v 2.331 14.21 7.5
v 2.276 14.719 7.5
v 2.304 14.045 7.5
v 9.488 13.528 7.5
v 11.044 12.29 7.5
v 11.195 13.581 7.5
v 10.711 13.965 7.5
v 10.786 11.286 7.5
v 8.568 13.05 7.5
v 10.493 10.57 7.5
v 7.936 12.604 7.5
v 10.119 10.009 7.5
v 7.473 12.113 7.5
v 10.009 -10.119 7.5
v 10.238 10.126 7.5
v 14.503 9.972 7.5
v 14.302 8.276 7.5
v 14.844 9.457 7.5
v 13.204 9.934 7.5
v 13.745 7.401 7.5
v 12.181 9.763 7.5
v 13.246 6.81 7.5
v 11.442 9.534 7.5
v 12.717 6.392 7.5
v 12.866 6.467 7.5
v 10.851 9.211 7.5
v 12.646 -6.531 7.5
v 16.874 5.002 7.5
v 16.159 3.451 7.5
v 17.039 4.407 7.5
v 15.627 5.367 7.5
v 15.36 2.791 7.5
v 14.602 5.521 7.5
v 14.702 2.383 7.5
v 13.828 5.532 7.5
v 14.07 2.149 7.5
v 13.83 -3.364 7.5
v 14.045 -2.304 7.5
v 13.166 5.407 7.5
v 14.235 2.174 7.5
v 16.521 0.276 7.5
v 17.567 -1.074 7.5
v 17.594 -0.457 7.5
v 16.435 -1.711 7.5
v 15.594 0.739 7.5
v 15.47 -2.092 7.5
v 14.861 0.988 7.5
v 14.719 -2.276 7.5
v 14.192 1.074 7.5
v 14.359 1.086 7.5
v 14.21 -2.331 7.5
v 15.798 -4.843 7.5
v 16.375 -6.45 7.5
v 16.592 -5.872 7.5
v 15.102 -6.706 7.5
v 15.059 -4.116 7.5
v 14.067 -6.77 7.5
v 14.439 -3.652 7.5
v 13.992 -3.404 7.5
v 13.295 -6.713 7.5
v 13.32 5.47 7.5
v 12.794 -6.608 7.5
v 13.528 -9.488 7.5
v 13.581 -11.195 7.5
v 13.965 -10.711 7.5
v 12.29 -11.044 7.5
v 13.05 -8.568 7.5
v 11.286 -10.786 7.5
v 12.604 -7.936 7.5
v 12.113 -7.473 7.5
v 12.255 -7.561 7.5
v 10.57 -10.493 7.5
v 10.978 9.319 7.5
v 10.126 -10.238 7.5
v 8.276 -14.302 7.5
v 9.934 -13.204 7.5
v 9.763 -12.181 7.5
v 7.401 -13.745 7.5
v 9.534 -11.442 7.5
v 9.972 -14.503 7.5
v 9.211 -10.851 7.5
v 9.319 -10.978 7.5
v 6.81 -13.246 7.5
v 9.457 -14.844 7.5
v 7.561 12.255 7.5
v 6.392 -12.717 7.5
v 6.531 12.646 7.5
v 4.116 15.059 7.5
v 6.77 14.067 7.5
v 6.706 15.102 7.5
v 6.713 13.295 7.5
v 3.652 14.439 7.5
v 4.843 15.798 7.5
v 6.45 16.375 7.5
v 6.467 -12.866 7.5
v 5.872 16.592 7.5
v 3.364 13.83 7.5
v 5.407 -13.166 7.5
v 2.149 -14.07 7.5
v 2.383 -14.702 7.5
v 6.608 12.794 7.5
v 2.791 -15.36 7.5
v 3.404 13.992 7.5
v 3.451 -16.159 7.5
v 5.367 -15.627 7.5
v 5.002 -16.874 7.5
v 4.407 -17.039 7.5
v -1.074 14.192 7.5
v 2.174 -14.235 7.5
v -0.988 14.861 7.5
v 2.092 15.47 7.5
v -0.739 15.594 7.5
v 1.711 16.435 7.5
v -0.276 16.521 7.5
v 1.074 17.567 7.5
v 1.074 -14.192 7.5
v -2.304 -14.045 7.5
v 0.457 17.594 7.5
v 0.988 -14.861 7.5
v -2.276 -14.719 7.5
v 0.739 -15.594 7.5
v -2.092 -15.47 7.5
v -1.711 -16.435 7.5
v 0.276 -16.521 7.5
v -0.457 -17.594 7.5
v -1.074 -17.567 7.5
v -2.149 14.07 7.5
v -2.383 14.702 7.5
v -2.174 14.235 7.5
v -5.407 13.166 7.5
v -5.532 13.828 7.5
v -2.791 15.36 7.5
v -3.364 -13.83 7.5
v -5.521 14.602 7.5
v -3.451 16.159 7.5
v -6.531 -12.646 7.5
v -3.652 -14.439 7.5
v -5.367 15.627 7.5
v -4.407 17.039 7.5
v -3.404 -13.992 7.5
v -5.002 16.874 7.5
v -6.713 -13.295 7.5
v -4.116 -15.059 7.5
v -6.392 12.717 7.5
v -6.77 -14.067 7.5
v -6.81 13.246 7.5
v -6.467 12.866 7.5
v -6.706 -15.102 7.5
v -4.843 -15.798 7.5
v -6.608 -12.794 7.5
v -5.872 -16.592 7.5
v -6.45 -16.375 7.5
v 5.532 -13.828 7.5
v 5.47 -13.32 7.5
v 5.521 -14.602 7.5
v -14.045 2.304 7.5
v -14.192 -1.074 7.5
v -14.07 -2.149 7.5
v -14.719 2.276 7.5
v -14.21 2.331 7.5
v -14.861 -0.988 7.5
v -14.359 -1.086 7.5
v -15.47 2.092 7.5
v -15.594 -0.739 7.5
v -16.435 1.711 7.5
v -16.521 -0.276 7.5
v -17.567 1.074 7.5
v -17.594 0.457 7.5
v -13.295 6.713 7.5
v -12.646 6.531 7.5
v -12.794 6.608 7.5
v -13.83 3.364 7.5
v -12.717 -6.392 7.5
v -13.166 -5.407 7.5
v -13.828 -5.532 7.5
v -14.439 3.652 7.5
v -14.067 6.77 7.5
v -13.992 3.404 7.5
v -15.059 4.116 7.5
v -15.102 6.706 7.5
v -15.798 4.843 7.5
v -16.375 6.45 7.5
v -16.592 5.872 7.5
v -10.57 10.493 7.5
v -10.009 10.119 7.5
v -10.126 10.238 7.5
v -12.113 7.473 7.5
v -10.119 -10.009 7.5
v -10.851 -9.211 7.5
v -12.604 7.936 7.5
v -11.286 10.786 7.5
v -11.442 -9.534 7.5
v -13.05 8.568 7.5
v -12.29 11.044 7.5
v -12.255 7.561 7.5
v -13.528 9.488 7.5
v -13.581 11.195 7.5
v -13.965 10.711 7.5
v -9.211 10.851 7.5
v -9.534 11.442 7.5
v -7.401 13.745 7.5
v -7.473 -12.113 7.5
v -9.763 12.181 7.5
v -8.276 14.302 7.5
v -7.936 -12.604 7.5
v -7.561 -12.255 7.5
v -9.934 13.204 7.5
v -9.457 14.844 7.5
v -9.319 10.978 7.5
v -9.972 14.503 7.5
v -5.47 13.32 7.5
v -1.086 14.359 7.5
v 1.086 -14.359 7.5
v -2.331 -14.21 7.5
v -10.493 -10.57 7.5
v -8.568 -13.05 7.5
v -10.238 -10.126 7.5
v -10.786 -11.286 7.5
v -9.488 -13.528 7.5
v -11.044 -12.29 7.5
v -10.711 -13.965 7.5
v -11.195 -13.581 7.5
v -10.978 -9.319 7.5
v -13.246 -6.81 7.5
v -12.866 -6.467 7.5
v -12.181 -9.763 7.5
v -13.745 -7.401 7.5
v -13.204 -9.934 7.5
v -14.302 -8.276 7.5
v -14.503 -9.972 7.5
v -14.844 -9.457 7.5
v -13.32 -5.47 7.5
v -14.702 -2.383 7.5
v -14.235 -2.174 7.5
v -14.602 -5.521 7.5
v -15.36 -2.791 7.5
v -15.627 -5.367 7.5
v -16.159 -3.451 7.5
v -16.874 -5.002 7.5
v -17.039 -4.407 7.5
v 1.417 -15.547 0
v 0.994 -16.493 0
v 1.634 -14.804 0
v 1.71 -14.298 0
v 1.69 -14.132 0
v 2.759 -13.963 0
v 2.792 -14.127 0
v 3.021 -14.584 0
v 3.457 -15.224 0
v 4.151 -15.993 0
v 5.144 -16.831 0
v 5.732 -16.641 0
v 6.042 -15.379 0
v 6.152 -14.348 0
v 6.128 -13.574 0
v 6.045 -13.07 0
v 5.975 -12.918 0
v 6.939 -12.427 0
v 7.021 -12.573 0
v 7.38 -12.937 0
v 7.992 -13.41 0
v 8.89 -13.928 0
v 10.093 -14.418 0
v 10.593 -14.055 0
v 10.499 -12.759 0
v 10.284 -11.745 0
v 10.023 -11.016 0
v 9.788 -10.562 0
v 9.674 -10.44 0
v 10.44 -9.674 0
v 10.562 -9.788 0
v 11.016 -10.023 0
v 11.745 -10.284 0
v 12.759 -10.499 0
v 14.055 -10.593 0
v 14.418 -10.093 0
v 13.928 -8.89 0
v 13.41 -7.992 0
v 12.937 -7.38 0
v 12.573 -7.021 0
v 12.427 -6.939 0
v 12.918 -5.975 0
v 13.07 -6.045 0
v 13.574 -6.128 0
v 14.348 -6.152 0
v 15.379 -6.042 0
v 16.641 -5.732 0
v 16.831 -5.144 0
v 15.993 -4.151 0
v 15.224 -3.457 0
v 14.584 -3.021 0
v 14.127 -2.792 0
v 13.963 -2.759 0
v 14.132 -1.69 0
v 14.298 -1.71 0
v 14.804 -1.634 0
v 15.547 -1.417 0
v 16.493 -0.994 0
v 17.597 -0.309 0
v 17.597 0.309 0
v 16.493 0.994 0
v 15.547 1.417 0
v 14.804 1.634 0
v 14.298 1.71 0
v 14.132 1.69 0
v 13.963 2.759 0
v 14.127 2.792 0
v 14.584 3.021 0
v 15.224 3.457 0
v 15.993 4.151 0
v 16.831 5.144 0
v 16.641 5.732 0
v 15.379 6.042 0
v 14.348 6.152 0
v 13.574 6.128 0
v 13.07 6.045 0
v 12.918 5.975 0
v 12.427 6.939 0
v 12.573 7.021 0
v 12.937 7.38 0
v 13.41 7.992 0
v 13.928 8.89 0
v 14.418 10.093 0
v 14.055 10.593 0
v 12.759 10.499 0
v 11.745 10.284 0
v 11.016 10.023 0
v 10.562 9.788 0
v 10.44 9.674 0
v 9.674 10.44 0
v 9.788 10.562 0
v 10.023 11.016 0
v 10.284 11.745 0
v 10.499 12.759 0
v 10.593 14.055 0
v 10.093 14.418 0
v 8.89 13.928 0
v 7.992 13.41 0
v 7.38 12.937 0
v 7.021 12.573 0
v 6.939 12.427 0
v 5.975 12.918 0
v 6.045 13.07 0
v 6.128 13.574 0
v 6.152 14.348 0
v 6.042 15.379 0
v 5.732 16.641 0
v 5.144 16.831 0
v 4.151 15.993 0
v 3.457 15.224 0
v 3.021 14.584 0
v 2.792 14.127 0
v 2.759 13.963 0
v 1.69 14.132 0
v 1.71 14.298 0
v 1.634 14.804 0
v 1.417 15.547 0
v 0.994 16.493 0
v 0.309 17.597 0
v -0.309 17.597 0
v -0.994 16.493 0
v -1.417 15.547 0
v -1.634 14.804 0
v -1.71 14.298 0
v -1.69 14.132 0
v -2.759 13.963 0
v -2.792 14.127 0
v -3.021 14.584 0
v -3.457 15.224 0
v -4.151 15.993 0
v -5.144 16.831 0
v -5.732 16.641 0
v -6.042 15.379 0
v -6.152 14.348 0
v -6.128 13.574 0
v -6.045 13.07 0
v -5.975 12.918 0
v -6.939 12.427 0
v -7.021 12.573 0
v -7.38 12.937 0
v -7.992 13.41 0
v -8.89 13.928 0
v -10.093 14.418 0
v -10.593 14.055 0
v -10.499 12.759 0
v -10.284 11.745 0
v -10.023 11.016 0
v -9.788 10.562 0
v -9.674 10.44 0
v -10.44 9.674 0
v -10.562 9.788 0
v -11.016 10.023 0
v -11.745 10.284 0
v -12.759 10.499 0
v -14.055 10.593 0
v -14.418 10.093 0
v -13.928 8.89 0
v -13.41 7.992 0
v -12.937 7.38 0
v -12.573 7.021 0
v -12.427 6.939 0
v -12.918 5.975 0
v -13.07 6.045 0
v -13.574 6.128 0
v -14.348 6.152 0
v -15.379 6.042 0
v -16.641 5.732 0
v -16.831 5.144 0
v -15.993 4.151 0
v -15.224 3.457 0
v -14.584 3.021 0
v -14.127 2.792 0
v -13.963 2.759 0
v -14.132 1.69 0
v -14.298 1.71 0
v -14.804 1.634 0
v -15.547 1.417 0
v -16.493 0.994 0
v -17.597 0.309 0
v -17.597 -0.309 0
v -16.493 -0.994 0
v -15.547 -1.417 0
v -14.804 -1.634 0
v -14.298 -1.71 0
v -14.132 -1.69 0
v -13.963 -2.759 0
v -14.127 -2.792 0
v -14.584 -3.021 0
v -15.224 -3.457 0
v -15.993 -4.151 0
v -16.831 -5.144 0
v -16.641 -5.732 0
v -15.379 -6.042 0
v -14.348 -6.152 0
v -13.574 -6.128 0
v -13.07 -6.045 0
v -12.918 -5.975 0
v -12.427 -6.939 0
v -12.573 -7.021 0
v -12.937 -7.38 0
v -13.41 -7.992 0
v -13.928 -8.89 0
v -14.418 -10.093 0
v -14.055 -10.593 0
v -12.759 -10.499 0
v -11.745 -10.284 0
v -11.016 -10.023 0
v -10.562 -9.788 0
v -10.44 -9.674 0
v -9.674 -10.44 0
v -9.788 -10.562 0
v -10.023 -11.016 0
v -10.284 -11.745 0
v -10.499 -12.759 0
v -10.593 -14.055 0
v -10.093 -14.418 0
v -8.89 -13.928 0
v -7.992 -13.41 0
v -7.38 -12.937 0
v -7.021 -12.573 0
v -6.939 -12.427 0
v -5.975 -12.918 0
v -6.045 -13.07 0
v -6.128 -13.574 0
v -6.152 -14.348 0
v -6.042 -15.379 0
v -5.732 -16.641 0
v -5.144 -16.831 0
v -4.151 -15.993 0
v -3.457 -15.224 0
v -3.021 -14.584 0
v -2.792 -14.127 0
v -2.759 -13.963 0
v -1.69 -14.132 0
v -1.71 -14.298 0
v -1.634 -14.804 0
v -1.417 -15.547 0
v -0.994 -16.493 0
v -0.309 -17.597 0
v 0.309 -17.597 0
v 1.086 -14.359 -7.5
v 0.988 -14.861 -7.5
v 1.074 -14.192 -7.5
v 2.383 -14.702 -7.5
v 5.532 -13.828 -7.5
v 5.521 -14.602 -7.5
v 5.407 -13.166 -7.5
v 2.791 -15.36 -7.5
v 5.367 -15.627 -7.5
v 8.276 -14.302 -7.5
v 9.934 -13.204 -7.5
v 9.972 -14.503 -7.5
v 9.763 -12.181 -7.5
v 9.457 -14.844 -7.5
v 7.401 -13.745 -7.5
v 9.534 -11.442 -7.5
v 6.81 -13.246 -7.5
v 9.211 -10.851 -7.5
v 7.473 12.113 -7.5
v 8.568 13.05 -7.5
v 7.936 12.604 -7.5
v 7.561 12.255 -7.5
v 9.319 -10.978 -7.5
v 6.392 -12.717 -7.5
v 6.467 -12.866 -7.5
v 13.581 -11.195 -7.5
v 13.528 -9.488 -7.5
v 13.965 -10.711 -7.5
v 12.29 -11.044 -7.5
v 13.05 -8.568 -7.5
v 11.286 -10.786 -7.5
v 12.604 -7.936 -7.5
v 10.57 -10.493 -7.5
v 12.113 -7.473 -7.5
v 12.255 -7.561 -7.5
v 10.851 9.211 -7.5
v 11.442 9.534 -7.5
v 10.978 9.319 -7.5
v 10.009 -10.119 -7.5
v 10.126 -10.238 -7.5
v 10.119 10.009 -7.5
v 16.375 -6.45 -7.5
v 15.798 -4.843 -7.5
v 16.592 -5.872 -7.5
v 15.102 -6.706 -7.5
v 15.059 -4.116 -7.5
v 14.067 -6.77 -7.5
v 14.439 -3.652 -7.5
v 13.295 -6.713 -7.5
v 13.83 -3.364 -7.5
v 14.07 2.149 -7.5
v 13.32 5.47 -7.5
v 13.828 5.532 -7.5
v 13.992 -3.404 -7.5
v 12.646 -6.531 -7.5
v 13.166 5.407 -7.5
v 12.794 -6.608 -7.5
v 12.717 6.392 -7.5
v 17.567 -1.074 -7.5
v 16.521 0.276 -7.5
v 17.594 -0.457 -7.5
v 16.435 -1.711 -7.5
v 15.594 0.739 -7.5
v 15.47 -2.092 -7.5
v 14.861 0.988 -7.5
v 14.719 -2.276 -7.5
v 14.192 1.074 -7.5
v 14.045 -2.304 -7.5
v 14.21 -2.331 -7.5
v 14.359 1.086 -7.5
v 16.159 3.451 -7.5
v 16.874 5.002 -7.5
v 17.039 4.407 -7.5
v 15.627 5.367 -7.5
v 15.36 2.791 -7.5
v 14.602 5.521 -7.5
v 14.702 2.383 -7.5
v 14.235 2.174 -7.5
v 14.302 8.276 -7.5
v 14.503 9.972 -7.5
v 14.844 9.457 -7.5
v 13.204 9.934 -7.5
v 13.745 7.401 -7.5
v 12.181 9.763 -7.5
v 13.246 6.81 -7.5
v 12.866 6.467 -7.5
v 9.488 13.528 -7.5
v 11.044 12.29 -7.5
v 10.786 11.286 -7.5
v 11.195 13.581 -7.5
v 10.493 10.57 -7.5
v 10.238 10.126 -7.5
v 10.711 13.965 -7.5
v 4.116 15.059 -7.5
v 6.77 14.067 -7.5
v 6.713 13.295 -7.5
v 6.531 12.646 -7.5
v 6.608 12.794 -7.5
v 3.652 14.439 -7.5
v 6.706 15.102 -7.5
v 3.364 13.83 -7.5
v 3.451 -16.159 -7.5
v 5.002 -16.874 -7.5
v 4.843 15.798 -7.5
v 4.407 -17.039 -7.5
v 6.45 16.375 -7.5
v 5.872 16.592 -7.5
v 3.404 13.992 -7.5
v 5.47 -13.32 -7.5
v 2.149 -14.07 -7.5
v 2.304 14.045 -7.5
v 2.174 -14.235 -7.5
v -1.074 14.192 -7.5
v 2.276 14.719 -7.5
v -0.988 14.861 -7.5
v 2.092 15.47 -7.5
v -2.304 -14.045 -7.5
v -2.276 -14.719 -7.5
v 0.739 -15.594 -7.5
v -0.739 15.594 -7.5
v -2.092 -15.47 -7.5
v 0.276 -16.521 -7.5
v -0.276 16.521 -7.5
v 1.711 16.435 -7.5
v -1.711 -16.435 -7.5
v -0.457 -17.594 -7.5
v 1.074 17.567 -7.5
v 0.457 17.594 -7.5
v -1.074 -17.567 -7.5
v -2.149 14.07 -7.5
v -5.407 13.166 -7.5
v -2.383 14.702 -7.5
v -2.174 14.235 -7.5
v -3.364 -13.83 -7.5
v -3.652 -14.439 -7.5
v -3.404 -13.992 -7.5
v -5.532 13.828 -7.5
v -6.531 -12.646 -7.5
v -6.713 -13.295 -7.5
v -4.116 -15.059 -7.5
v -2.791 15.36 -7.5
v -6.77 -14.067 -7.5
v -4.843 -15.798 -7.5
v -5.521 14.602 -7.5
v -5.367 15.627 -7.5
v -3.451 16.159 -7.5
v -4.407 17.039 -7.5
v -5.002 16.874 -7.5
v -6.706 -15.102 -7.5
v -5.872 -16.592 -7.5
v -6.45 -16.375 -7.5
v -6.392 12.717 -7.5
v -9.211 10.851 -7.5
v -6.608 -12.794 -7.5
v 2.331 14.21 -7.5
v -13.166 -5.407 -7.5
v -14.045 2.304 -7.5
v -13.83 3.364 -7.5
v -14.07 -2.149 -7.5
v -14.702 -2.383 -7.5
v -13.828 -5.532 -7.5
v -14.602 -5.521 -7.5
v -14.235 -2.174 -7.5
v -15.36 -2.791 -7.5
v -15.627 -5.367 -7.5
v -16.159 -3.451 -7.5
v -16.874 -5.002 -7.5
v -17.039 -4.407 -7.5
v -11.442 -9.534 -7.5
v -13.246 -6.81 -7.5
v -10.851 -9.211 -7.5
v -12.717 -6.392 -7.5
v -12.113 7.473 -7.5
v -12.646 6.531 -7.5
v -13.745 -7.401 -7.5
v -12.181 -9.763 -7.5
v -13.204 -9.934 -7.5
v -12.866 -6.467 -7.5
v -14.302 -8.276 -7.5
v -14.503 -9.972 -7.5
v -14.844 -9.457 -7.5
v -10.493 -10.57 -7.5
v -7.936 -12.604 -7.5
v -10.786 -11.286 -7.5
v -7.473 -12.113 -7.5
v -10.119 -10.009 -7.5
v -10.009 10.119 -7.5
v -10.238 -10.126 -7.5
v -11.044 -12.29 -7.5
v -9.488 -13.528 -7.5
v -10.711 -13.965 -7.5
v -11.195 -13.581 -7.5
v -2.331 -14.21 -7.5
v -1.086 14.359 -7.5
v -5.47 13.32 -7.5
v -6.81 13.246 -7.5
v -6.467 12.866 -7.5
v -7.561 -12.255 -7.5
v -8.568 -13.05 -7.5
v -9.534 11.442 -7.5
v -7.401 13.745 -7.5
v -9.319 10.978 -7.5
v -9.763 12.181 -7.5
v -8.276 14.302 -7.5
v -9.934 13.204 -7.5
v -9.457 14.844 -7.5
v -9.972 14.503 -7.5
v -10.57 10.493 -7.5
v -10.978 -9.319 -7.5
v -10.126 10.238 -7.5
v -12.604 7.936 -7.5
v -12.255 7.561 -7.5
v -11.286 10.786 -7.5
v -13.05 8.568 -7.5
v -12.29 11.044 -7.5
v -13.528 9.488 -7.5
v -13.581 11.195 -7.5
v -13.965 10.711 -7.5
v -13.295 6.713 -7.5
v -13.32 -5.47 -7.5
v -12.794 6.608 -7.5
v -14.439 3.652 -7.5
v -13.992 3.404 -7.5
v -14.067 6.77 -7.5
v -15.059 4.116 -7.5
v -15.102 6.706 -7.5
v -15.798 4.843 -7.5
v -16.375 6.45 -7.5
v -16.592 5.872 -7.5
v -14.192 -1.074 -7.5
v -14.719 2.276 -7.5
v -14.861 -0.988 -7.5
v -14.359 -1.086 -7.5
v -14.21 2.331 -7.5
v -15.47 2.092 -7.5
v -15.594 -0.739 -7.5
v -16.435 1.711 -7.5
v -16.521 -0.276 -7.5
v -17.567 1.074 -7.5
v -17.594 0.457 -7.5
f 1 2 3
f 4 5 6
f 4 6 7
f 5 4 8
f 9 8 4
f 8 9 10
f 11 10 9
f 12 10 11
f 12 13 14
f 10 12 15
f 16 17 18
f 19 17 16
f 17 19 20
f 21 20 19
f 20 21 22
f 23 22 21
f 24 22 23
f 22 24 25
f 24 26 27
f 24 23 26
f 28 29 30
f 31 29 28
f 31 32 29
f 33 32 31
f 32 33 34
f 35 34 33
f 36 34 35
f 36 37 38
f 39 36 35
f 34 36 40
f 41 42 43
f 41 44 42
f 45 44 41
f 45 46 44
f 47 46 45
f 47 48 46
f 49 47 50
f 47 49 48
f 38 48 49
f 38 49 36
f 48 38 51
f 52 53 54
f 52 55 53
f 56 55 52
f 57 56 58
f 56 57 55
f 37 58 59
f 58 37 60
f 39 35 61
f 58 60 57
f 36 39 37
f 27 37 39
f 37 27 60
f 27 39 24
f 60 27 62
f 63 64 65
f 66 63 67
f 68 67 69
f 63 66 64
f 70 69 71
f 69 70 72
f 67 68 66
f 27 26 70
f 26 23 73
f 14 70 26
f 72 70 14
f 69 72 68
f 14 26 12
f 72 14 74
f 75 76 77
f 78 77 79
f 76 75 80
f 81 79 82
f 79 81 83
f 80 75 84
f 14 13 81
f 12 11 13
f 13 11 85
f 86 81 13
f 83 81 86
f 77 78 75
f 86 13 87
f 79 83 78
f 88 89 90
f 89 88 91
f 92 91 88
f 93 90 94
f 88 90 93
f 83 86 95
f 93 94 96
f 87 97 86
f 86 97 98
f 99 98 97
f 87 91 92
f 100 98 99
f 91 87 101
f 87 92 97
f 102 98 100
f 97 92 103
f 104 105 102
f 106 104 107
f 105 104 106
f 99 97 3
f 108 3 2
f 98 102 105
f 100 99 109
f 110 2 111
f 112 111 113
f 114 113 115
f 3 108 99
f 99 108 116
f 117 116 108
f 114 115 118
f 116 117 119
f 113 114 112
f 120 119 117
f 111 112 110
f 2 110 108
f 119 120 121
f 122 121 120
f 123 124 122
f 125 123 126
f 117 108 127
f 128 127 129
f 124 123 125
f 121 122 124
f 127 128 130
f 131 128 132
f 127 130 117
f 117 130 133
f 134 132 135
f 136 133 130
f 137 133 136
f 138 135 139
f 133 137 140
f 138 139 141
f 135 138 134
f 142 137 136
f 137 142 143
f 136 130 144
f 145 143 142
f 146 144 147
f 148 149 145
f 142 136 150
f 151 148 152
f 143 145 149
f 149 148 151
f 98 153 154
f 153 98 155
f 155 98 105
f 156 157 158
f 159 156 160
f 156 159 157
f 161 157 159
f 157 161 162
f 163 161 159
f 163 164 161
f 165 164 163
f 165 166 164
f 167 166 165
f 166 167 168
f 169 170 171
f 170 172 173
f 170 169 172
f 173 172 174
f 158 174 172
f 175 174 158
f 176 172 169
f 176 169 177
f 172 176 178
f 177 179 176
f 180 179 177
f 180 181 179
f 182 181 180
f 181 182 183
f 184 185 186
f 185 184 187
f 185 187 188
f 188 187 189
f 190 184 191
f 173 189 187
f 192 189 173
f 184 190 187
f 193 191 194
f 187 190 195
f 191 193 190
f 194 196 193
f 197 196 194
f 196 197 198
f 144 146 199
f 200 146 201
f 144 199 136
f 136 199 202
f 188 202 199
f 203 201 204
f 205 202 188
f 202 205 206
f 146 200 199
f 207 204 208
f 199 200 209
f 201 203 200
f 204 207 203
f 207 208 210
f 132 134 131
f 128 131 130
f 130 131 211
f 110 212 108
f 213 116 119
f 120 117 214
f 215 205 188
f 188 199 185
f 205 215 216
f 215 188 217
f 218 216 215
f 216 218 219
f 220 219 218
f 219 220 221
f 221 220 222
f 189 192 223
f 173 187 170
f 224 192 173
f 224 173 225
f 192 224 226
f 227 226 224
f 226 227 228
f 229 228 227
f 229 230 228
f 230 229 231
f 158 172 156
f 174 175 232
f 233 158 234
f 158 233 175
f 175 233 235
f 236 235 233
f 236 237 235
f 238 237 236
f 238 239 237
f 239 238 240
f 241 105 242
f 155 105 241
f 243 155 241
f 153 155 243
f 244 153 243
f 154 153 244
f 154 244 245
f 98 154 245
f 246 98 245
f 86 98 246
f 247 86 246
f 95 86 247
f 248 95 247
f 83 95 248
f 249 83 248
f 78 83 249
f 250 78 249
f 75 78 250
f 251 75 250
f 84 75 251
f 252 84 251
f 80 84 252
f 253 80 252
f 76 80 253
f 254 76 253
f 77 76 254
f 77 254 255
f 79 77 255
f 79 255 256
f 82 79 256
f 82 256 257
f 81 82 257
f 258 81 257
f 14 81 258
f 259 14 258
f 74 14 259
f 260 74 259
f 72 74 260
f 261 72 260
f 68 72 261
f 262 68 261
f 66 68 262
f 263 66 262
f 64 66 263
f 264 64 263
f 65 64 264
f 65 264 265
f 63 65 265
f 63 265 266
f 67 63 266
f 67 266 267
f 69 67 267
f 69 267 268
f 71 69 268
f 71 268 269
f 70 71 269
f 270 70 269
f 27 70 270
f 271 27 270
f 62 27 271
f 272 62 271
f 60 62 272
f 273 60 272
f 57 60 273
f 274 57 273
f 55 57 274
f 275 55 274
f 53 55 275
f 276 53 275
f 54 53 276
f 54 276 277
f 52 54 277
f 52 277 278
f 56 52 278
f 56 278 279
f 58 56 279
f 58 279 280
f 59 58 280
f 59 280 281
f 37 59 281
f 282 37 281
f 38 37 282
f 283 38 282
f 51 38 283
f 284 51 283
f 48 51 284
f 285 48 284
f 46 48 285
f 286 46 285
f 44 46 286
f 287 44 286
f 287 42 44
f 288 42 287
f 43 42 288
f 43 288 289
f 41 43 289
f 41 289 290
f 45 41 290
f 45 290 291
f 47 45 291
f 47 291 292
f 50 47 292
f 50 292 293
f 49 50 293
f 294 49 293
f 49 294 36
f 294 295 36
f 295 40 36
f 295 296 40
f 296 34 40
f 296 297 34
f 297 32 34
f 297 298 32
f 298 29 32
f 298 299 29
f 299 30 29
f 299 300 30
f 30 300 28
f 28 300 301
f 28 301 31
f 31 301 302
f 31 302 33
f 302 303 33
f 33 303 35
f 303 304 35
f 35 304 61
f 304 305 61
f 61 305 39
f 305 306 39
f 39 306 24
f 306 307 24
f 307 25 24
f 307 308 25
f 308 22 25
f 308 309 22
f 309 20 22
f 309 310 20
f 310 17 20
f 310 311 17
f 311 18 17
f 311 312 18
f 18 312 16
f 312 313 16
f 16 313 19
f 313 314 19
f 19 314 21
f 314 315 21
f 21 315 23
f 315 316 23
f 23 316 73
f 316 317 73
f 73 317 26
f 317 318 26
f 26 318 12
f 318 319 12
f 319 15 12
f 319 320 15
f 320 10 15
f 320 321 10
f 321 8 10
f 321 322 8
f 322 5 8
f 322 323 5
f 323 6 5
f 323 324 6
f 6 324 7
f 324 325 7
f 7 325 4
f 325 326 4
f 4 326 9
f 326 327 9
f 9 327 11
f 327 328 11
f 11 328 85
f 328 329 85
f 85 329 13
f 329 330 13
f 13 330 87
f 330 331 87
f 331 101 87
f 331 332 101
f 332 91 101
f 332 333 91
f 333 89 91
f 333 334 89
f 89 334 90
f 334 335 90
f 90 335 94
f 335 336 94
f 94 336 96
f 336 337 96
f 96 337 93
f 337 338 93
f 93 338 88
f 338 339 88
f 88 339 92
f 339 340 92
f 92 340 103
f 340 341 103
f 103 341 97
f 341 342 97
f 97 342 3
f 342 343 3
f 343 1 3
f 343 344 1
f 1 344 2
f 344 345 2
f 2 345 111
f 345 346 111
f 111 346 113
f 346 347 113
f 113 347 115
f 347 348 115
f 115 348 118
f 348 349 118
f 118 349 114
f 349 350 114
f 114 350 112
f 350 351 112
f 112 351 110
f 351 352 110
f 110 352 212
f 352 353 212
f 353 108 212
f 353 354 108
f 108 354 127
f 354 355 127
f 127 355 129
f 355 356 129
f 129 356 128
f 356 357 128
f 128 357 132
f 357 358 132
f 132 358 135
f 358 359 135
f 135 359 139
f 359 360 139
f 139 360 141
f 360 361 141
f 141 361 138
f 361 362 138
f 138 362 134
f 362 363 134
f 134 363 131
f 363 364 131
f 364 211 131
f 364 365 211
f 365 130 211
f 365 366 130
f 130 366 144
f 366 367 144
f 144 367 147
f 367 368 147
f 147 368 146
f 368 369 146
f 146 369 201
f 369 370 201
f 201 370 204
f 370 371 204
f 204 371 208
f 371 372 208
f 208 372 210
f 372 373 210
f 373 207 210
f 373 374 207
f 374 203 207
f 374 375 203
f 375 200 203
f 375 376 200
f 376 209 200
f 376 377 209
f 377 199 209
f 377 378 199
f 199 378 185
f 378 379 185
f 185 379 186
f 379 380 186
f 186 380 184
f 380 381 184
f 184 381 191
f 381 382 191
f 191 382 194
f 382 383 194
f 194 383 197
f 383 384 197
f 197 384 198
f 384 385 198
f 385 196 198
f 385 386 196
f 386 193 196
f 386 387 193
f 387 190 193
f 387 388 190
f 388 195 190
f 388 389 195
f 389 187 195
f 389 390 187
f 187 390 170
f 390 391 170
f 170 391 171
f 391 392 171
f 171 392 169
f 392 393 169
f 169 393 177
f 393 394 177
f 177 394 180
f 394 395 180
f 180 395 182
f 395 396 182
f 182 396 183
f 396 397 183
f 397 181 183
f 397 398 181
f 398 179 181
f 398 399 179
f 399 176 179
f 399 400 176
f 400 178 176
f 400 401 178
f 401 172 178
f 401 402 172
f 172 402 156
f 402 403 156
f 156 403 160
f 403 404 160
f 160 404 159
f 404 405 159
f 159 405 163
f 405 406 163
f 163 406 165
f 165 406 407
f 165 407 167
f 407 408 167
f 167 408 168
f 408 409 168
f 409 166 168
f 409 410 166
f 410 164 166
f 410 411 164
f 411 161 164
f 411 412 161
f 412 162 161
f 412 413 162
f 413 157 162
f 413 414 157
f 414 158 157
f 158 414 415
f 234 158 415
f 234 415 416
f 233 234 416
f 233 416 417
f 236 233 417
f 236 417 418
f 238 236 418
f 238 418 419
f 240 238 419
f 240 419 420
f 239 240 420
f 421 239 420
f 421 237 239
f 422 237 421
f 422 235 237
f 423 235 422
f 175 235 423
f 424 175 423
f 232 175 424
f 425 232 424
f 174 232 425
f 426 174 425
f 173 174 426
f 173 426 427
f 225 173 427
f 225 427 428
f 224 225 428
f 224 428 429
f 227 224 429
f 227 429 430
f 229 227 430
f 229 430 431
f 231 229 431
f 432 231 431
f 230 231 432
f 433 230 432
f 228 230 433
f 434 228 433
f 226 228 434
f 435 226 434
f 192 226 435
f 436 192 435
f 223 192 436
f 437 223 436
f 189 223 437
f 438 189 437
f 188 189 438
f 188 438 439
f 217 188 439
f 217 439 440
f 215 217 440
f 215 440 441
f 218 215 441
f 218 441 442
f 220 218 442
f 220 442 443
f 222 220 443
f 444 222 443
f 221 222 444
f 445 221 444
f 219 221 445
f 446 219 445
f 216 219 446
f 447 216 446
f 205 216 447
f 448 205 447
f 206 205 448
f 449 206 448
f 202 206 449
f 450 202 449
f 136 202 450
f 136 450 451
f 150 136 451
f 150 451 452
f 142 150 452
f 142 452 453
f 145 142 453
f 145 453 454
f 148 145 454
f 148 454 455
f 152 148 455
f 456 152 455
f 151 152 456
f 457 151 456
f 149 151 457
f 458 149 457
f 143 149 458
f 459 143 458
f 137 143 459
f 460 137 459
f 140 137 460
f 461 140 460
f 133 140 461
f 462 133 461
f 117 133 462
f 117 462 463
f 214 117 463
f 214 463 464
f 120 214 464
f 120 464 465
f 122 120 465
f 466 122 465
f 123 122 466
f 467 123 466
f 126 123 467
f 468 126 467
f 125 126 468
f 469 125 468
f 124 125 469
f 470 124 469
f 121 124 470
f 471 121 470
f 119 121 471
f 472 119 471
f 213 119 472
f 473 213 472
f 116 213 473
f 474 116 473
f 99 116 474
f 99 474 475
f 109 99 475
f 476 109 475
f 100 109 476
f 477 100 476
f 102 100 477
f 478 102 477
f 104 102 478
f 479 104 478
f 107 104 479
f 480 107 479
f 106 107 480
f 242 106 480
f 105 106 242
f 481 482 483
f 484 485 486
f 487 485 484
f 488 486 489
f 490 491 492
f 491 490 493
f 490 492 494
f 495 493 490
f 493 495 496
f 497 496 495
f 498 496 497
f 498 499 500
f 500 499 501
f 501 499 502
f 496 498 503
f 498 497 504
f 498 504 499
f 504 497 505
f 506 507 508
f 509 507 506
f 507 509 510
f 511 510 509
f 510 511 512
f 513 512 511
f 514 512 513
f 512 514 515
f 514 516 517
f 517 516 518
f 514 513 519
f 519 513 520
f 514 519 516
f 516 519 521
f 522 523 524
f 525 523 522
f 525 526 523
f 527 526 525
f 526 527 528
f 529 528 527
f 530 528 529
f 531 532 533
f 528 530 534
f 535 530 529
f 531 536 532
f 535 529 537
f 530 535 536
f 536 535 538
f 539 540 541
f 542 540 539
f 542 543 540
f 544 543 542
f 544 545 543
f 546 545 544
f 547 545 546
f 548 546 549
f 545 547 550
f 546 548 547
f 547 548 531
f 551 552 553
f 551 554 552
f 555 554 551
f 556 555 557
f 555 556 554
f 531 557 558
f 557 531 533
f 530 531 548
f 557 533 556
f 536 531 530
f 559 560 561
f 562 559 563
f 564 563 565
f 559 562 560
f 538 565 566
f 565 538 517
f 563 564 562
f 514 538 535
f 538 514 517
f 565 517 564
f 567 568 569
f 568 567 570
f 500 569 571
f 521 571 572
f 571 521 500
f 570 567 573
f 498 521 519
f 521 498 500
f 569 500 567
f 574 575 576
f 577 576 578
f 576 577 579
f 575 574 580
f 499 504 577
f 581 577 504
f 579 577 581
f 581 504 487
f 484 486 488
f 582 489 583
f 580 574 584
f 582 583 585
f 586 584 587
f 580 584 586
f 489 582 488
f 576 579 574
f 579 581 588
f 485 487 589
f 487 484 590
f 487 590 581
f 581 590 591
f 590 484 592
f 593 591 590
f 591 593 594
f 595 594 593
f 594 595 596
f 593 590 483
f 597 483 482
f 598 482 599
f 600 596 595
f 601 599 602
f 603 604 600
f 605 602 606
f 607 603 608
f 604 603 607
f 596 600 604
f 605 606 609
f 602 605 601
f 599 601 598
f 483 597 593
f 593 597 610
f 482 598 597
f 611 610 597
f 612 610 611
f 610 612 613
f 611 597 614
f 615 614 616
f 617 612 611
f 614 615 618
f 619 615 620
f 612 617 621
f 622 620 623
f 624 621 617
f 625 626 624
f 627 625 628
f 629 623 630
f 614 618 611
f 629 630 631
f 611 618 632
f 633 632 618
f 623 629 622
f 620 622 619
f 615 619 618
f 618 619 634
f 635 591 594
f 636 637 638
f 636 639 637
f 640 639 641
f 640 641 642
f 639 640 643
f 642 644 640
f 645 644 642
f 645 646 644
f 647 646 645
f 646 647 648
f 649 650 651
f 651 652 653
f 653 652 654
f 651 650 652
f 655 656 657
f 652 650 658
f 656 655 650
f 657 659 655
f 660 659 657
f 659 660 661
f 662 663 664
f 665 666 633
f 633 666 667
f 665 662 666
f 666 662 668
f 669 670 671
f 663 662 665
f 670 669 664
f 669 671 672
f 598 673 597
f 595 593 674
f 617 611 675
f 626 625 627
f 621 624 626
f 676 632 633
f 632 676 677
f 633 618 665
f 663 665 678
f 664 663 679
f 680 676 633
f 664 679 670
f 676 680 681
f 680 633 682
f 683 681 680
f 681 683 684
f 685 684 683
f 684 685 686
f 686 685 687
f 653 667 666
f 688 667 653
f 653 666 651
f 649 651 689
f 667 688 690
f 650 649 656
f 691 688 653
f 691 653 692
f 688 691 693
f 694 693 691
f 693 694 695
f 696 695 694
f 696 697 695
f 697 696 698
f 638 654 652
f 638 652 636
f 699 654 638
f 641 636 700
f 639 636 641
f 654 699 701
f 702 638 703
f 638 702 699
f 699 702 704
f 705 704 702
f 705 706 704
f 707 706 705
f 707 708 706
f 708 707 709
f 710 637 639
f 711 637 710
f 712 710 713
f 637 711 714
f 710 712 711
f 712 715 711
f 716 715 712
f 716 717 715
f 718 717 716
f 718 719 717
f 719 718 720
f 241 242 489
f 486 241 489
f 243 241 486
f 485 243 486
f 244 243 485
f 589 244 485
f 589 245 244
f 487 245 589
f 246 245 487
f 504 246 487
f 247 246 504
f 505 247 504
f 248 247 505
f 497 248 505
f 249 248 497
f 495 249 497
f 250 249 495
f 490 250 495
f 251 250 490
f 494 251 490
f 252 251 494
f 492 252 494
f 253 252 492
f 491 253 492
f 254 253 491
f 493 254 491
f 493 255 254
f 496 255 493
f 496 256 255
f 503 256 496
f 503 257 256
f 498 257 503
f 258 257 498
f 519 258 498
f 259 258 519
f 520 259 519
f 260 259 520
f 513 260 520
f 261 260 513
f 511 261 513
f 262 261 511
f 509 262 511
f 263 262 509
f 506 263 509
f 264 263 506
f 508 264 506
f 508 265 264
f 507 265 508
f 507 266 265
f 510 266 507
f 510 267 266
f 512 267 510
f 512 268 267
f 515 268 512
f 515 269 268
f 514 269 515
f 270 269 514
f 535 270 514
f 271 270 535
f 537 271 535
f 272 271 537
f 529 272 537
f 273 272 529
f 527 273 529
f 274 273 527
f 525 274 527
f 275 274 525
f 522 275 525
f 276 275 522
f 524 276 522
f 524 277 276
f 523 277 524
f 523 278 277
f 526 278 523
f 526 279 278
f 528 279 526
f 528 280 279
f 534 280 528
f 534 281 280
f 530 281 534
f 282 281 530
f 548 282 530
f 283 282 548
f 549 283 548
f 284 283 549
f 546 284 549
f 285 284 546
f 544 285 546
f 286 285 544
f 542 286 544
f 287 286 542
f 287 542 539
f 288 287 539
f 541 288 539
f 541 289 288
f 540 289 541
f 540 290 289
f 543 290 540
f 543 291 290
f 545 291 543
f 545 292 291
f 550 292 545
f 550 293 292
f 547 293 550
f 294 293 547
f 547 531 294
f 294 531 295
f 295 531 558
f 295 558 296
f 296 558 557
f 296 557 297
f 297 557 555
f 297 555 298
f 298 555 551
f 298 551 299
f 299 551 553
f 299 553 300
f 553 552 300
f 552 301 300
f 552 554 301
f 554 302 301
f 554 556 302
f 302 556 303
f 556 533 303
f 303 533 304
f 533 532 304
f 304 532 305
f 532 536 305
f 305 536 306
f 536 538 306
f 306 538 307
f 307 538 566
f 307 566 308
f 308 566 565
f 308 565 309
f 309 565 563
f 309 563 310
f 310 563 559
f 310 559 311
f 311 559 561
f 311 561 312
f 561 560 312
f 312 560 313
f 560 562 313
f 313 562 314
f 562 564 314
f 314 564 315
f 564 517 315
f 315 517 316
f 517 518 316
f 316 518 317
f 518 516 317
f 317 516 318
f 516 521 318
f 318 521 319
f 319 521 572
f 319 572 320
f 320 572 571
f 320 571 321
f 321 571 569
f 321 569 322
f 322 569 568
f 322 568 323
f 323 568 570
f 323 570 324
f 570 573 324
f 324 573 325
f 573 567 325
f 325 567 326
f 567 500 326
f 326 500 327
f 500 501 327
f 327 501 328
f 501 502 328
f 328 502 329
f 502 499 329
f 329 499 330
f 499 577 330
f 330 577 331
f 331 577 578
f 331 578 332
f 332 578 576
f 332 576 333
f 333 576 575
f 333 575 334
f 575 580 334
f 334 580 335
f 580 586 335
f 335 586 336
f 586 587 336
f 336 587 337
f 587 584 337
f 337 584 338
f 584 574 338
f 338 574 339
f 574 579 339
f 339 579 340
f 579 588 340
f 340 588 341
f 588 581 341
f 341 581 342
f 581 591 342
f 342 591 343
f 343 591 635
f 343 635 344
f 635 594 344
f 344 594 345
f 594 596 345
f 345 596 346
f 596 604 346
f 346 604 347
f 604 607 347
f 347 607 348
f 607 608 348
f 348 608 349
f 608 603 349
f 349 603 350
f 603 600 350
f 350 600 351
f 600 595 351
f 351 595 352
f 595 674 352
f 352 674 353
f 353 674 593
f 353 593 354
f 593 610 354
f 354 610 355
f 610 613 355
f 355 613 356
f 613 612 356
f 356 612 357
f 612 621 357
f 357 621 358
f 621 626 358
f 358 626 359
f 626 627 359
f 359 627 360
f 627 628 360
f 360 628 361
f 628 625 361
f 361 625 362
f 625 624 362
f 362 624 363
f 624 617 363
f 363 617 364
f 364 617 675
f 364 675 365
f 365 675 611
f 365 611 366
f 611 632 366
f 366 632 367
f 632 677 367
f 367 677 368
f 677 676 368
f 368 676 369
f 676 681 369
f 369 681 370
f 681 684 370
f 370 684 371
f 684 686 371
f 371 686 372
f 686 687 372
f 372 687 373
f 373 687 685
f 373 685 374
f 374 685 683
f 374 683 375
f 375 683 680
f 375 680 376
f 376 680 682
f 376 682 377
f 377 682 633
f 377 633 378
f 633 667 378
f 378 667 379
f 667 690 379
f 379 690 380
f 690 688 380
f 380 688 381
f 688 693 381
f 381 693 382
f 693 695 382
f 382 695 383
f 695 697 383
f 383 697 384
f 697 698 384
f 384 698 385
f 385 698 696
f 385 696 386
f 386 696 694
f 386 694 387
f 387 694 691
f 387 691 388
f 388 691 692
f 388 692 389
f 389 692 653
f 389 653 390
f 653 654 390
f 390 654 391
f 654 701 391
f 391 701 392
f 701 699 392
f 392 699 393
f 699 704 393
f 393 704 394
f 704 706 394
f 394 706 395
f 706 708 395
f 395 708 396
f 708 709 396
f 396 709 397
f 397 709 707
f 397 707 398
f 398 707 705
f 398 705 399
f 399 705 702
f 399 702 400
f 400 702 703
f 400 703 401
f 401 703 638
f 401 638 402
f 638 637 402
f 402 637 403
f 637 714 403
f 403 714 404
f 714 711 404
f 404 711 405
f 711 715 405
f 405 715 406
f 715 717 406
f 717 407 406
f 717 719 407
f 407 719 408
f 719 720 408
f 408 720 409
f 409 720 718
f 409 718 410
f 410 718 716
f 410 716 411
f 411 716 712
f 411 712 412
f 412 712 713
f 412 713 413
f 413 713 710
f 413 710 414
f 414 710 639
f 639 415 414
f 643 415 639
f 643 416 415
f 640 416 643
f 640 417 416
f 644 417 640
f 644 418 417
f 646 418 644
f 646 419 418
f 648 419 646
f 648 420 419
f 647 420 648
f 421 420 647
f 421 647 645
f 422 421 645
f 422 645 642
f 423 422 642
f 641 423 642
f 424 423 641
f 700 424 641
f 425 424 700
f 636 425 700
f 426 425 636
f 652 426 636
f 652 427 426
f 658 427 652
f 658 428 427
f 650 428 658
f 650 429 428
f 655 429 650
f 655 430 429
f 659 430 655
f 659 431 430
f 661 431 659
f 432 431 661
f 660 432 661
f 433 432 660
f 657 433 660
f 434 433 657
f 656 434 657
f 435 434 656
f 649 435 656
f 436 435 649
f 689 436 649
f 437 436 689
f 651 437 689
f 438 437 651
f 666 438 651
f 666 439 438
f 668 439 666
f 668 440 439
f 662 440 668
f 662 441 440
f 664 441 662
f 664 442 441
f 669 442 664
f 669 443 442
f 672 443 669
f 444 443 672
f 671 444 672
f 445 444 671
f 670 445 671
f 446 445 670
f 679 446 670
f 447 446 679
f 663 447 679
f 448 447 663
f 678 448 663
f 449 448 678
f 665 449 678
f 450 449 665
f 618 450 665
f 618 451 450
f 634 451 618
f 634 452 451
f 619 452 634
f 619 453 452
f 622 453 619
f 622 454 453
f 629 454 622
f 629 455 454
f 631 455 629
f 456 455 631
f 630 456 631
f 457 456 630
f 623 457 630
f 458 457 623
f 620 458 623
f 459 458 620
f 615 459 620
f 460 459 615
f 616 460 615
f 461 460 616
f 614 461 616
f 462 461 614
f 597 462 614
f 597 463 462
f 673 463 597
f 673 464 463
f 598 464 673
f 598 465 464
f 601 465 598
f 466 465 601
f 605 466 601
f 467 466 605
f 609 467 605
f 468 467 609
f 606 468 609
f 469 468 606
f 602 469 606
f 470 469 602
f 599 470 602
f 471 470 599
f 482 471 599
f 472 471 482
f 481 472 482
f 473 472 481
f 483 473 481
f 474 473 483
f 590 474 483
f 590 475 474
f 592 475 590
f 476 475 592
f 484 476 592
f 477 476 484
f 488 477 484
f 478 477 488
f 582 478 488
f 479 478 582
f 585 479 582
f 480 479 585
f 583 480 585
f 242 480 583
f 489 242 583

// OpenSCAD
translate([0,0,0])gear20();
//gear40();

module gear20(){
union(){
difference(){
		gear(pitch_radius=16, teeth=20, height=7.5, helix_angle=30);
		translate([0,0,-1]){
			//cylinder(r=4.2,h=10);
			for(i=[0:3]){
				//rotate(i*90)translate([8,0,0])cylinder(r=2.1,h=10, $fn=10);
			}
		}
	}	
mirror([0,0,1]){difference(){
		gear(pitch_radius=16, teeth=20, height=7.5, helix_angle=30);
		translate([0,0,-1]){
			//cylinder(r=4.2,h=10);
			for(i=[0:3]){
				//rotate(i*90)translate([8,0,0])cylinder(r=2.1,h=10, $fn=10);
			}
		}
	}
}
}
}

module gear40(){

	difference(){
		rotate(36/8)gear(pitch_radius=32, teeth=40, height=7.5, helix_angle=-30);
		translate([0,0,-1]){
			//cylinder(r=4.2,h=10);
			for(i=[0:3]){
				//rotate(i*90)translate([8,0,0])cylinder(r=2.1,h=10,$fn=10);
				//rotate(i*90)translate([24,0,0])cylinder(r=2.1,h=10,$fn=10);
			}
		}
	}
mirror([0,0,1])difference(){
		rotate(36/8)gear(pitch_radius=32, teeth=40, height=7.5, helix_angle=-30);
		translate([0,0,-1]){
			//cylinder(r=4.2,h=10);
			for(i=[0:3]){
				//rotate(i*90)translate([8,0,0])cylinder(r=2.1,h=10,$fn=10);
				//rotate(i*90)translate([24,0,0])cylinder(r=2.1,h=10,$fn=10);
			}
		}
	}

}

/* GEAR */
module gear(
		pitch_radius,
		teeth,
		height,
		pressure_angle=28,
		clearance=0,
		backlash=0,
		involute_facets=5,
		helix_angle=0,
		helix_segments=1){
// Properties
base_radius=pitch_radius*cos(pressure_angle);
addendum = 2*pitch_radius/teeth;
circular_pitch = pitch_radius*6.28318531/teeth;
outside_radius = pitch_radius + addendum;
dedendum = addendum+clearance;
root_radius = pitch_radius-dedendum;
// Calculations
min_t=base_radius<root_radius?angle(root_radius,base_radius):0;
max_t=angle(outside_radius,base_radius);
delta_t=(max_t-min_t)/(involute_facets-1);
half_circular_thickness_angle = 28.64788976/pitch_radius*(circular_pitch-backlash)*.5;
pitch_involute_point=involute(angle(pitch_radius,base_radius),base_radius);
offset=atan2(pitch_involute_point[1],pitch_involute_point[0]);
// Construction
linear_extrude(height=height,twist=tan(-helix_angle)*height*57.29577951/pitch_radius,slices=helix_segments,convexity=teeth){
	circle(r=root_radius,$fn=teeth);
	for(i=[0:involute_facets-2]){
		assign(point1=rotate(involute(min_t+i*delta_t,base_radius),-offset-half_circular_thickness_angle),
		point2=rotate(involute(min_t+(i+1)*delta_t,base_radius),-offset-half_circular_thickness_angle),
		delta_theta=360/teeth){
			for(theta=[0:teeth-1]){
				rotate(theta*delta_theta)
					polygon(points=[[0,0],point1,point2,mirror(point2),mirror(point1)],paths=[[0,1,2,3,4]]);
			}
		}
	}
}}

/* RACK GEAR */
module rack(
		mating_pitch_radius,
		mating_teeth,
		teeth,
		height,
		base_depth,
		pressure_angle=28,
		clearance=0,
		backlash=0,
		helix_angle=0){
// Properties
addendum=2*mating_pitch_radius/mating_teeth;
dedendum=addendum+clearance;
offset_a=tan(pressure_angle)*addendum;
offset_d=tan(pressure_angle)*dedendum;
half_tooth_width=mating_pitch_radius*1.57079633/mating_teeth;
helix_offset=tan(helix_angle)*height;
// Construct teeth
for(i=[0:teeth-1]){
	translate([i*half_tooth_width*4-half_tooth_width,0,0])
		polyhedron(points=[[-offset_d+backlash/4,-dedendum,0],[offset_a+backlash/4,addendum,0],[2*half_tooth_width-offset_a-backlash/4,addendum,0],[2*half_tooth_width+offset_d-backlash/4,-dedendum,0],[-offset_d+backlash/4+helix_offset,-dedendum,height],[offset_a+backlash/4+helix_offset,addendum,height],[2*half_tooth_width-offset_a-backlash/4+helix_offset,addendum,height],[2*half_tooth_width+offset_d-backlash/4+helix_offset,-dedendum,height]],triangles=[[0,1,2],[2,3,0],[4,5,6],[6,7,4],[0,1,4],[1,4,5],[1,2,5],[5,6,2],[2,3,6],[6,7,3],[0,3,4],[4,7,3]],convexity=1);
}
// Construct base
if(base_depth<dedendum){echo("ERROR: Rack base_depth too small.");}
x=-offset_d-half_tooth_width+backlash/4;
y=-base_depth;
x2=x+helix_offset;
width=half_tooth_width*4*(teeth-1)+half_tooth_width*2+2*offset_d-backlash/2;
length=base_depth-dedendum;
polyhedron(points=[[x,y,0],[x,y+length,0],[x+width,y+length,0],[x+width,y,0],[x2,y,height],[x2,y+length,height],[x2+width,y+length,height],[x2+width,y,height]],triangles=[[0,1,2],[2,3,0],[4,5,6],[6,7,4],[0,1,4],[1,4,5],[1,2,5],[5,6,2],[2,3,6],[6,7,3],[0,3,4],[4,7,3]]);
}

/* FUNCTIONS */
function toRadians(angle) = angle*0.01745329;
function toDegrees(angle) = angle*57.29577951;
function rotate(point,angle)=[point[0]*cos(angle)-point[1]*sin(angle), point[1]*cos(angle)+point[0]*sin(angle)];
function mirror(point)=[point[0],-point[1]];
// [x,y] for 't' on parametric involute with base radius 'b'
	function involute(t,b)=b*[cos(t)+toRadians(t)*sin(t),sin(t)-toRadians(t)*cos(t)];
// 't' for parametric involute with base radius 'b' at radius 'r'
	function angle(r,b)=toDegrees(sqrt(pow(r/b,2)-1));
